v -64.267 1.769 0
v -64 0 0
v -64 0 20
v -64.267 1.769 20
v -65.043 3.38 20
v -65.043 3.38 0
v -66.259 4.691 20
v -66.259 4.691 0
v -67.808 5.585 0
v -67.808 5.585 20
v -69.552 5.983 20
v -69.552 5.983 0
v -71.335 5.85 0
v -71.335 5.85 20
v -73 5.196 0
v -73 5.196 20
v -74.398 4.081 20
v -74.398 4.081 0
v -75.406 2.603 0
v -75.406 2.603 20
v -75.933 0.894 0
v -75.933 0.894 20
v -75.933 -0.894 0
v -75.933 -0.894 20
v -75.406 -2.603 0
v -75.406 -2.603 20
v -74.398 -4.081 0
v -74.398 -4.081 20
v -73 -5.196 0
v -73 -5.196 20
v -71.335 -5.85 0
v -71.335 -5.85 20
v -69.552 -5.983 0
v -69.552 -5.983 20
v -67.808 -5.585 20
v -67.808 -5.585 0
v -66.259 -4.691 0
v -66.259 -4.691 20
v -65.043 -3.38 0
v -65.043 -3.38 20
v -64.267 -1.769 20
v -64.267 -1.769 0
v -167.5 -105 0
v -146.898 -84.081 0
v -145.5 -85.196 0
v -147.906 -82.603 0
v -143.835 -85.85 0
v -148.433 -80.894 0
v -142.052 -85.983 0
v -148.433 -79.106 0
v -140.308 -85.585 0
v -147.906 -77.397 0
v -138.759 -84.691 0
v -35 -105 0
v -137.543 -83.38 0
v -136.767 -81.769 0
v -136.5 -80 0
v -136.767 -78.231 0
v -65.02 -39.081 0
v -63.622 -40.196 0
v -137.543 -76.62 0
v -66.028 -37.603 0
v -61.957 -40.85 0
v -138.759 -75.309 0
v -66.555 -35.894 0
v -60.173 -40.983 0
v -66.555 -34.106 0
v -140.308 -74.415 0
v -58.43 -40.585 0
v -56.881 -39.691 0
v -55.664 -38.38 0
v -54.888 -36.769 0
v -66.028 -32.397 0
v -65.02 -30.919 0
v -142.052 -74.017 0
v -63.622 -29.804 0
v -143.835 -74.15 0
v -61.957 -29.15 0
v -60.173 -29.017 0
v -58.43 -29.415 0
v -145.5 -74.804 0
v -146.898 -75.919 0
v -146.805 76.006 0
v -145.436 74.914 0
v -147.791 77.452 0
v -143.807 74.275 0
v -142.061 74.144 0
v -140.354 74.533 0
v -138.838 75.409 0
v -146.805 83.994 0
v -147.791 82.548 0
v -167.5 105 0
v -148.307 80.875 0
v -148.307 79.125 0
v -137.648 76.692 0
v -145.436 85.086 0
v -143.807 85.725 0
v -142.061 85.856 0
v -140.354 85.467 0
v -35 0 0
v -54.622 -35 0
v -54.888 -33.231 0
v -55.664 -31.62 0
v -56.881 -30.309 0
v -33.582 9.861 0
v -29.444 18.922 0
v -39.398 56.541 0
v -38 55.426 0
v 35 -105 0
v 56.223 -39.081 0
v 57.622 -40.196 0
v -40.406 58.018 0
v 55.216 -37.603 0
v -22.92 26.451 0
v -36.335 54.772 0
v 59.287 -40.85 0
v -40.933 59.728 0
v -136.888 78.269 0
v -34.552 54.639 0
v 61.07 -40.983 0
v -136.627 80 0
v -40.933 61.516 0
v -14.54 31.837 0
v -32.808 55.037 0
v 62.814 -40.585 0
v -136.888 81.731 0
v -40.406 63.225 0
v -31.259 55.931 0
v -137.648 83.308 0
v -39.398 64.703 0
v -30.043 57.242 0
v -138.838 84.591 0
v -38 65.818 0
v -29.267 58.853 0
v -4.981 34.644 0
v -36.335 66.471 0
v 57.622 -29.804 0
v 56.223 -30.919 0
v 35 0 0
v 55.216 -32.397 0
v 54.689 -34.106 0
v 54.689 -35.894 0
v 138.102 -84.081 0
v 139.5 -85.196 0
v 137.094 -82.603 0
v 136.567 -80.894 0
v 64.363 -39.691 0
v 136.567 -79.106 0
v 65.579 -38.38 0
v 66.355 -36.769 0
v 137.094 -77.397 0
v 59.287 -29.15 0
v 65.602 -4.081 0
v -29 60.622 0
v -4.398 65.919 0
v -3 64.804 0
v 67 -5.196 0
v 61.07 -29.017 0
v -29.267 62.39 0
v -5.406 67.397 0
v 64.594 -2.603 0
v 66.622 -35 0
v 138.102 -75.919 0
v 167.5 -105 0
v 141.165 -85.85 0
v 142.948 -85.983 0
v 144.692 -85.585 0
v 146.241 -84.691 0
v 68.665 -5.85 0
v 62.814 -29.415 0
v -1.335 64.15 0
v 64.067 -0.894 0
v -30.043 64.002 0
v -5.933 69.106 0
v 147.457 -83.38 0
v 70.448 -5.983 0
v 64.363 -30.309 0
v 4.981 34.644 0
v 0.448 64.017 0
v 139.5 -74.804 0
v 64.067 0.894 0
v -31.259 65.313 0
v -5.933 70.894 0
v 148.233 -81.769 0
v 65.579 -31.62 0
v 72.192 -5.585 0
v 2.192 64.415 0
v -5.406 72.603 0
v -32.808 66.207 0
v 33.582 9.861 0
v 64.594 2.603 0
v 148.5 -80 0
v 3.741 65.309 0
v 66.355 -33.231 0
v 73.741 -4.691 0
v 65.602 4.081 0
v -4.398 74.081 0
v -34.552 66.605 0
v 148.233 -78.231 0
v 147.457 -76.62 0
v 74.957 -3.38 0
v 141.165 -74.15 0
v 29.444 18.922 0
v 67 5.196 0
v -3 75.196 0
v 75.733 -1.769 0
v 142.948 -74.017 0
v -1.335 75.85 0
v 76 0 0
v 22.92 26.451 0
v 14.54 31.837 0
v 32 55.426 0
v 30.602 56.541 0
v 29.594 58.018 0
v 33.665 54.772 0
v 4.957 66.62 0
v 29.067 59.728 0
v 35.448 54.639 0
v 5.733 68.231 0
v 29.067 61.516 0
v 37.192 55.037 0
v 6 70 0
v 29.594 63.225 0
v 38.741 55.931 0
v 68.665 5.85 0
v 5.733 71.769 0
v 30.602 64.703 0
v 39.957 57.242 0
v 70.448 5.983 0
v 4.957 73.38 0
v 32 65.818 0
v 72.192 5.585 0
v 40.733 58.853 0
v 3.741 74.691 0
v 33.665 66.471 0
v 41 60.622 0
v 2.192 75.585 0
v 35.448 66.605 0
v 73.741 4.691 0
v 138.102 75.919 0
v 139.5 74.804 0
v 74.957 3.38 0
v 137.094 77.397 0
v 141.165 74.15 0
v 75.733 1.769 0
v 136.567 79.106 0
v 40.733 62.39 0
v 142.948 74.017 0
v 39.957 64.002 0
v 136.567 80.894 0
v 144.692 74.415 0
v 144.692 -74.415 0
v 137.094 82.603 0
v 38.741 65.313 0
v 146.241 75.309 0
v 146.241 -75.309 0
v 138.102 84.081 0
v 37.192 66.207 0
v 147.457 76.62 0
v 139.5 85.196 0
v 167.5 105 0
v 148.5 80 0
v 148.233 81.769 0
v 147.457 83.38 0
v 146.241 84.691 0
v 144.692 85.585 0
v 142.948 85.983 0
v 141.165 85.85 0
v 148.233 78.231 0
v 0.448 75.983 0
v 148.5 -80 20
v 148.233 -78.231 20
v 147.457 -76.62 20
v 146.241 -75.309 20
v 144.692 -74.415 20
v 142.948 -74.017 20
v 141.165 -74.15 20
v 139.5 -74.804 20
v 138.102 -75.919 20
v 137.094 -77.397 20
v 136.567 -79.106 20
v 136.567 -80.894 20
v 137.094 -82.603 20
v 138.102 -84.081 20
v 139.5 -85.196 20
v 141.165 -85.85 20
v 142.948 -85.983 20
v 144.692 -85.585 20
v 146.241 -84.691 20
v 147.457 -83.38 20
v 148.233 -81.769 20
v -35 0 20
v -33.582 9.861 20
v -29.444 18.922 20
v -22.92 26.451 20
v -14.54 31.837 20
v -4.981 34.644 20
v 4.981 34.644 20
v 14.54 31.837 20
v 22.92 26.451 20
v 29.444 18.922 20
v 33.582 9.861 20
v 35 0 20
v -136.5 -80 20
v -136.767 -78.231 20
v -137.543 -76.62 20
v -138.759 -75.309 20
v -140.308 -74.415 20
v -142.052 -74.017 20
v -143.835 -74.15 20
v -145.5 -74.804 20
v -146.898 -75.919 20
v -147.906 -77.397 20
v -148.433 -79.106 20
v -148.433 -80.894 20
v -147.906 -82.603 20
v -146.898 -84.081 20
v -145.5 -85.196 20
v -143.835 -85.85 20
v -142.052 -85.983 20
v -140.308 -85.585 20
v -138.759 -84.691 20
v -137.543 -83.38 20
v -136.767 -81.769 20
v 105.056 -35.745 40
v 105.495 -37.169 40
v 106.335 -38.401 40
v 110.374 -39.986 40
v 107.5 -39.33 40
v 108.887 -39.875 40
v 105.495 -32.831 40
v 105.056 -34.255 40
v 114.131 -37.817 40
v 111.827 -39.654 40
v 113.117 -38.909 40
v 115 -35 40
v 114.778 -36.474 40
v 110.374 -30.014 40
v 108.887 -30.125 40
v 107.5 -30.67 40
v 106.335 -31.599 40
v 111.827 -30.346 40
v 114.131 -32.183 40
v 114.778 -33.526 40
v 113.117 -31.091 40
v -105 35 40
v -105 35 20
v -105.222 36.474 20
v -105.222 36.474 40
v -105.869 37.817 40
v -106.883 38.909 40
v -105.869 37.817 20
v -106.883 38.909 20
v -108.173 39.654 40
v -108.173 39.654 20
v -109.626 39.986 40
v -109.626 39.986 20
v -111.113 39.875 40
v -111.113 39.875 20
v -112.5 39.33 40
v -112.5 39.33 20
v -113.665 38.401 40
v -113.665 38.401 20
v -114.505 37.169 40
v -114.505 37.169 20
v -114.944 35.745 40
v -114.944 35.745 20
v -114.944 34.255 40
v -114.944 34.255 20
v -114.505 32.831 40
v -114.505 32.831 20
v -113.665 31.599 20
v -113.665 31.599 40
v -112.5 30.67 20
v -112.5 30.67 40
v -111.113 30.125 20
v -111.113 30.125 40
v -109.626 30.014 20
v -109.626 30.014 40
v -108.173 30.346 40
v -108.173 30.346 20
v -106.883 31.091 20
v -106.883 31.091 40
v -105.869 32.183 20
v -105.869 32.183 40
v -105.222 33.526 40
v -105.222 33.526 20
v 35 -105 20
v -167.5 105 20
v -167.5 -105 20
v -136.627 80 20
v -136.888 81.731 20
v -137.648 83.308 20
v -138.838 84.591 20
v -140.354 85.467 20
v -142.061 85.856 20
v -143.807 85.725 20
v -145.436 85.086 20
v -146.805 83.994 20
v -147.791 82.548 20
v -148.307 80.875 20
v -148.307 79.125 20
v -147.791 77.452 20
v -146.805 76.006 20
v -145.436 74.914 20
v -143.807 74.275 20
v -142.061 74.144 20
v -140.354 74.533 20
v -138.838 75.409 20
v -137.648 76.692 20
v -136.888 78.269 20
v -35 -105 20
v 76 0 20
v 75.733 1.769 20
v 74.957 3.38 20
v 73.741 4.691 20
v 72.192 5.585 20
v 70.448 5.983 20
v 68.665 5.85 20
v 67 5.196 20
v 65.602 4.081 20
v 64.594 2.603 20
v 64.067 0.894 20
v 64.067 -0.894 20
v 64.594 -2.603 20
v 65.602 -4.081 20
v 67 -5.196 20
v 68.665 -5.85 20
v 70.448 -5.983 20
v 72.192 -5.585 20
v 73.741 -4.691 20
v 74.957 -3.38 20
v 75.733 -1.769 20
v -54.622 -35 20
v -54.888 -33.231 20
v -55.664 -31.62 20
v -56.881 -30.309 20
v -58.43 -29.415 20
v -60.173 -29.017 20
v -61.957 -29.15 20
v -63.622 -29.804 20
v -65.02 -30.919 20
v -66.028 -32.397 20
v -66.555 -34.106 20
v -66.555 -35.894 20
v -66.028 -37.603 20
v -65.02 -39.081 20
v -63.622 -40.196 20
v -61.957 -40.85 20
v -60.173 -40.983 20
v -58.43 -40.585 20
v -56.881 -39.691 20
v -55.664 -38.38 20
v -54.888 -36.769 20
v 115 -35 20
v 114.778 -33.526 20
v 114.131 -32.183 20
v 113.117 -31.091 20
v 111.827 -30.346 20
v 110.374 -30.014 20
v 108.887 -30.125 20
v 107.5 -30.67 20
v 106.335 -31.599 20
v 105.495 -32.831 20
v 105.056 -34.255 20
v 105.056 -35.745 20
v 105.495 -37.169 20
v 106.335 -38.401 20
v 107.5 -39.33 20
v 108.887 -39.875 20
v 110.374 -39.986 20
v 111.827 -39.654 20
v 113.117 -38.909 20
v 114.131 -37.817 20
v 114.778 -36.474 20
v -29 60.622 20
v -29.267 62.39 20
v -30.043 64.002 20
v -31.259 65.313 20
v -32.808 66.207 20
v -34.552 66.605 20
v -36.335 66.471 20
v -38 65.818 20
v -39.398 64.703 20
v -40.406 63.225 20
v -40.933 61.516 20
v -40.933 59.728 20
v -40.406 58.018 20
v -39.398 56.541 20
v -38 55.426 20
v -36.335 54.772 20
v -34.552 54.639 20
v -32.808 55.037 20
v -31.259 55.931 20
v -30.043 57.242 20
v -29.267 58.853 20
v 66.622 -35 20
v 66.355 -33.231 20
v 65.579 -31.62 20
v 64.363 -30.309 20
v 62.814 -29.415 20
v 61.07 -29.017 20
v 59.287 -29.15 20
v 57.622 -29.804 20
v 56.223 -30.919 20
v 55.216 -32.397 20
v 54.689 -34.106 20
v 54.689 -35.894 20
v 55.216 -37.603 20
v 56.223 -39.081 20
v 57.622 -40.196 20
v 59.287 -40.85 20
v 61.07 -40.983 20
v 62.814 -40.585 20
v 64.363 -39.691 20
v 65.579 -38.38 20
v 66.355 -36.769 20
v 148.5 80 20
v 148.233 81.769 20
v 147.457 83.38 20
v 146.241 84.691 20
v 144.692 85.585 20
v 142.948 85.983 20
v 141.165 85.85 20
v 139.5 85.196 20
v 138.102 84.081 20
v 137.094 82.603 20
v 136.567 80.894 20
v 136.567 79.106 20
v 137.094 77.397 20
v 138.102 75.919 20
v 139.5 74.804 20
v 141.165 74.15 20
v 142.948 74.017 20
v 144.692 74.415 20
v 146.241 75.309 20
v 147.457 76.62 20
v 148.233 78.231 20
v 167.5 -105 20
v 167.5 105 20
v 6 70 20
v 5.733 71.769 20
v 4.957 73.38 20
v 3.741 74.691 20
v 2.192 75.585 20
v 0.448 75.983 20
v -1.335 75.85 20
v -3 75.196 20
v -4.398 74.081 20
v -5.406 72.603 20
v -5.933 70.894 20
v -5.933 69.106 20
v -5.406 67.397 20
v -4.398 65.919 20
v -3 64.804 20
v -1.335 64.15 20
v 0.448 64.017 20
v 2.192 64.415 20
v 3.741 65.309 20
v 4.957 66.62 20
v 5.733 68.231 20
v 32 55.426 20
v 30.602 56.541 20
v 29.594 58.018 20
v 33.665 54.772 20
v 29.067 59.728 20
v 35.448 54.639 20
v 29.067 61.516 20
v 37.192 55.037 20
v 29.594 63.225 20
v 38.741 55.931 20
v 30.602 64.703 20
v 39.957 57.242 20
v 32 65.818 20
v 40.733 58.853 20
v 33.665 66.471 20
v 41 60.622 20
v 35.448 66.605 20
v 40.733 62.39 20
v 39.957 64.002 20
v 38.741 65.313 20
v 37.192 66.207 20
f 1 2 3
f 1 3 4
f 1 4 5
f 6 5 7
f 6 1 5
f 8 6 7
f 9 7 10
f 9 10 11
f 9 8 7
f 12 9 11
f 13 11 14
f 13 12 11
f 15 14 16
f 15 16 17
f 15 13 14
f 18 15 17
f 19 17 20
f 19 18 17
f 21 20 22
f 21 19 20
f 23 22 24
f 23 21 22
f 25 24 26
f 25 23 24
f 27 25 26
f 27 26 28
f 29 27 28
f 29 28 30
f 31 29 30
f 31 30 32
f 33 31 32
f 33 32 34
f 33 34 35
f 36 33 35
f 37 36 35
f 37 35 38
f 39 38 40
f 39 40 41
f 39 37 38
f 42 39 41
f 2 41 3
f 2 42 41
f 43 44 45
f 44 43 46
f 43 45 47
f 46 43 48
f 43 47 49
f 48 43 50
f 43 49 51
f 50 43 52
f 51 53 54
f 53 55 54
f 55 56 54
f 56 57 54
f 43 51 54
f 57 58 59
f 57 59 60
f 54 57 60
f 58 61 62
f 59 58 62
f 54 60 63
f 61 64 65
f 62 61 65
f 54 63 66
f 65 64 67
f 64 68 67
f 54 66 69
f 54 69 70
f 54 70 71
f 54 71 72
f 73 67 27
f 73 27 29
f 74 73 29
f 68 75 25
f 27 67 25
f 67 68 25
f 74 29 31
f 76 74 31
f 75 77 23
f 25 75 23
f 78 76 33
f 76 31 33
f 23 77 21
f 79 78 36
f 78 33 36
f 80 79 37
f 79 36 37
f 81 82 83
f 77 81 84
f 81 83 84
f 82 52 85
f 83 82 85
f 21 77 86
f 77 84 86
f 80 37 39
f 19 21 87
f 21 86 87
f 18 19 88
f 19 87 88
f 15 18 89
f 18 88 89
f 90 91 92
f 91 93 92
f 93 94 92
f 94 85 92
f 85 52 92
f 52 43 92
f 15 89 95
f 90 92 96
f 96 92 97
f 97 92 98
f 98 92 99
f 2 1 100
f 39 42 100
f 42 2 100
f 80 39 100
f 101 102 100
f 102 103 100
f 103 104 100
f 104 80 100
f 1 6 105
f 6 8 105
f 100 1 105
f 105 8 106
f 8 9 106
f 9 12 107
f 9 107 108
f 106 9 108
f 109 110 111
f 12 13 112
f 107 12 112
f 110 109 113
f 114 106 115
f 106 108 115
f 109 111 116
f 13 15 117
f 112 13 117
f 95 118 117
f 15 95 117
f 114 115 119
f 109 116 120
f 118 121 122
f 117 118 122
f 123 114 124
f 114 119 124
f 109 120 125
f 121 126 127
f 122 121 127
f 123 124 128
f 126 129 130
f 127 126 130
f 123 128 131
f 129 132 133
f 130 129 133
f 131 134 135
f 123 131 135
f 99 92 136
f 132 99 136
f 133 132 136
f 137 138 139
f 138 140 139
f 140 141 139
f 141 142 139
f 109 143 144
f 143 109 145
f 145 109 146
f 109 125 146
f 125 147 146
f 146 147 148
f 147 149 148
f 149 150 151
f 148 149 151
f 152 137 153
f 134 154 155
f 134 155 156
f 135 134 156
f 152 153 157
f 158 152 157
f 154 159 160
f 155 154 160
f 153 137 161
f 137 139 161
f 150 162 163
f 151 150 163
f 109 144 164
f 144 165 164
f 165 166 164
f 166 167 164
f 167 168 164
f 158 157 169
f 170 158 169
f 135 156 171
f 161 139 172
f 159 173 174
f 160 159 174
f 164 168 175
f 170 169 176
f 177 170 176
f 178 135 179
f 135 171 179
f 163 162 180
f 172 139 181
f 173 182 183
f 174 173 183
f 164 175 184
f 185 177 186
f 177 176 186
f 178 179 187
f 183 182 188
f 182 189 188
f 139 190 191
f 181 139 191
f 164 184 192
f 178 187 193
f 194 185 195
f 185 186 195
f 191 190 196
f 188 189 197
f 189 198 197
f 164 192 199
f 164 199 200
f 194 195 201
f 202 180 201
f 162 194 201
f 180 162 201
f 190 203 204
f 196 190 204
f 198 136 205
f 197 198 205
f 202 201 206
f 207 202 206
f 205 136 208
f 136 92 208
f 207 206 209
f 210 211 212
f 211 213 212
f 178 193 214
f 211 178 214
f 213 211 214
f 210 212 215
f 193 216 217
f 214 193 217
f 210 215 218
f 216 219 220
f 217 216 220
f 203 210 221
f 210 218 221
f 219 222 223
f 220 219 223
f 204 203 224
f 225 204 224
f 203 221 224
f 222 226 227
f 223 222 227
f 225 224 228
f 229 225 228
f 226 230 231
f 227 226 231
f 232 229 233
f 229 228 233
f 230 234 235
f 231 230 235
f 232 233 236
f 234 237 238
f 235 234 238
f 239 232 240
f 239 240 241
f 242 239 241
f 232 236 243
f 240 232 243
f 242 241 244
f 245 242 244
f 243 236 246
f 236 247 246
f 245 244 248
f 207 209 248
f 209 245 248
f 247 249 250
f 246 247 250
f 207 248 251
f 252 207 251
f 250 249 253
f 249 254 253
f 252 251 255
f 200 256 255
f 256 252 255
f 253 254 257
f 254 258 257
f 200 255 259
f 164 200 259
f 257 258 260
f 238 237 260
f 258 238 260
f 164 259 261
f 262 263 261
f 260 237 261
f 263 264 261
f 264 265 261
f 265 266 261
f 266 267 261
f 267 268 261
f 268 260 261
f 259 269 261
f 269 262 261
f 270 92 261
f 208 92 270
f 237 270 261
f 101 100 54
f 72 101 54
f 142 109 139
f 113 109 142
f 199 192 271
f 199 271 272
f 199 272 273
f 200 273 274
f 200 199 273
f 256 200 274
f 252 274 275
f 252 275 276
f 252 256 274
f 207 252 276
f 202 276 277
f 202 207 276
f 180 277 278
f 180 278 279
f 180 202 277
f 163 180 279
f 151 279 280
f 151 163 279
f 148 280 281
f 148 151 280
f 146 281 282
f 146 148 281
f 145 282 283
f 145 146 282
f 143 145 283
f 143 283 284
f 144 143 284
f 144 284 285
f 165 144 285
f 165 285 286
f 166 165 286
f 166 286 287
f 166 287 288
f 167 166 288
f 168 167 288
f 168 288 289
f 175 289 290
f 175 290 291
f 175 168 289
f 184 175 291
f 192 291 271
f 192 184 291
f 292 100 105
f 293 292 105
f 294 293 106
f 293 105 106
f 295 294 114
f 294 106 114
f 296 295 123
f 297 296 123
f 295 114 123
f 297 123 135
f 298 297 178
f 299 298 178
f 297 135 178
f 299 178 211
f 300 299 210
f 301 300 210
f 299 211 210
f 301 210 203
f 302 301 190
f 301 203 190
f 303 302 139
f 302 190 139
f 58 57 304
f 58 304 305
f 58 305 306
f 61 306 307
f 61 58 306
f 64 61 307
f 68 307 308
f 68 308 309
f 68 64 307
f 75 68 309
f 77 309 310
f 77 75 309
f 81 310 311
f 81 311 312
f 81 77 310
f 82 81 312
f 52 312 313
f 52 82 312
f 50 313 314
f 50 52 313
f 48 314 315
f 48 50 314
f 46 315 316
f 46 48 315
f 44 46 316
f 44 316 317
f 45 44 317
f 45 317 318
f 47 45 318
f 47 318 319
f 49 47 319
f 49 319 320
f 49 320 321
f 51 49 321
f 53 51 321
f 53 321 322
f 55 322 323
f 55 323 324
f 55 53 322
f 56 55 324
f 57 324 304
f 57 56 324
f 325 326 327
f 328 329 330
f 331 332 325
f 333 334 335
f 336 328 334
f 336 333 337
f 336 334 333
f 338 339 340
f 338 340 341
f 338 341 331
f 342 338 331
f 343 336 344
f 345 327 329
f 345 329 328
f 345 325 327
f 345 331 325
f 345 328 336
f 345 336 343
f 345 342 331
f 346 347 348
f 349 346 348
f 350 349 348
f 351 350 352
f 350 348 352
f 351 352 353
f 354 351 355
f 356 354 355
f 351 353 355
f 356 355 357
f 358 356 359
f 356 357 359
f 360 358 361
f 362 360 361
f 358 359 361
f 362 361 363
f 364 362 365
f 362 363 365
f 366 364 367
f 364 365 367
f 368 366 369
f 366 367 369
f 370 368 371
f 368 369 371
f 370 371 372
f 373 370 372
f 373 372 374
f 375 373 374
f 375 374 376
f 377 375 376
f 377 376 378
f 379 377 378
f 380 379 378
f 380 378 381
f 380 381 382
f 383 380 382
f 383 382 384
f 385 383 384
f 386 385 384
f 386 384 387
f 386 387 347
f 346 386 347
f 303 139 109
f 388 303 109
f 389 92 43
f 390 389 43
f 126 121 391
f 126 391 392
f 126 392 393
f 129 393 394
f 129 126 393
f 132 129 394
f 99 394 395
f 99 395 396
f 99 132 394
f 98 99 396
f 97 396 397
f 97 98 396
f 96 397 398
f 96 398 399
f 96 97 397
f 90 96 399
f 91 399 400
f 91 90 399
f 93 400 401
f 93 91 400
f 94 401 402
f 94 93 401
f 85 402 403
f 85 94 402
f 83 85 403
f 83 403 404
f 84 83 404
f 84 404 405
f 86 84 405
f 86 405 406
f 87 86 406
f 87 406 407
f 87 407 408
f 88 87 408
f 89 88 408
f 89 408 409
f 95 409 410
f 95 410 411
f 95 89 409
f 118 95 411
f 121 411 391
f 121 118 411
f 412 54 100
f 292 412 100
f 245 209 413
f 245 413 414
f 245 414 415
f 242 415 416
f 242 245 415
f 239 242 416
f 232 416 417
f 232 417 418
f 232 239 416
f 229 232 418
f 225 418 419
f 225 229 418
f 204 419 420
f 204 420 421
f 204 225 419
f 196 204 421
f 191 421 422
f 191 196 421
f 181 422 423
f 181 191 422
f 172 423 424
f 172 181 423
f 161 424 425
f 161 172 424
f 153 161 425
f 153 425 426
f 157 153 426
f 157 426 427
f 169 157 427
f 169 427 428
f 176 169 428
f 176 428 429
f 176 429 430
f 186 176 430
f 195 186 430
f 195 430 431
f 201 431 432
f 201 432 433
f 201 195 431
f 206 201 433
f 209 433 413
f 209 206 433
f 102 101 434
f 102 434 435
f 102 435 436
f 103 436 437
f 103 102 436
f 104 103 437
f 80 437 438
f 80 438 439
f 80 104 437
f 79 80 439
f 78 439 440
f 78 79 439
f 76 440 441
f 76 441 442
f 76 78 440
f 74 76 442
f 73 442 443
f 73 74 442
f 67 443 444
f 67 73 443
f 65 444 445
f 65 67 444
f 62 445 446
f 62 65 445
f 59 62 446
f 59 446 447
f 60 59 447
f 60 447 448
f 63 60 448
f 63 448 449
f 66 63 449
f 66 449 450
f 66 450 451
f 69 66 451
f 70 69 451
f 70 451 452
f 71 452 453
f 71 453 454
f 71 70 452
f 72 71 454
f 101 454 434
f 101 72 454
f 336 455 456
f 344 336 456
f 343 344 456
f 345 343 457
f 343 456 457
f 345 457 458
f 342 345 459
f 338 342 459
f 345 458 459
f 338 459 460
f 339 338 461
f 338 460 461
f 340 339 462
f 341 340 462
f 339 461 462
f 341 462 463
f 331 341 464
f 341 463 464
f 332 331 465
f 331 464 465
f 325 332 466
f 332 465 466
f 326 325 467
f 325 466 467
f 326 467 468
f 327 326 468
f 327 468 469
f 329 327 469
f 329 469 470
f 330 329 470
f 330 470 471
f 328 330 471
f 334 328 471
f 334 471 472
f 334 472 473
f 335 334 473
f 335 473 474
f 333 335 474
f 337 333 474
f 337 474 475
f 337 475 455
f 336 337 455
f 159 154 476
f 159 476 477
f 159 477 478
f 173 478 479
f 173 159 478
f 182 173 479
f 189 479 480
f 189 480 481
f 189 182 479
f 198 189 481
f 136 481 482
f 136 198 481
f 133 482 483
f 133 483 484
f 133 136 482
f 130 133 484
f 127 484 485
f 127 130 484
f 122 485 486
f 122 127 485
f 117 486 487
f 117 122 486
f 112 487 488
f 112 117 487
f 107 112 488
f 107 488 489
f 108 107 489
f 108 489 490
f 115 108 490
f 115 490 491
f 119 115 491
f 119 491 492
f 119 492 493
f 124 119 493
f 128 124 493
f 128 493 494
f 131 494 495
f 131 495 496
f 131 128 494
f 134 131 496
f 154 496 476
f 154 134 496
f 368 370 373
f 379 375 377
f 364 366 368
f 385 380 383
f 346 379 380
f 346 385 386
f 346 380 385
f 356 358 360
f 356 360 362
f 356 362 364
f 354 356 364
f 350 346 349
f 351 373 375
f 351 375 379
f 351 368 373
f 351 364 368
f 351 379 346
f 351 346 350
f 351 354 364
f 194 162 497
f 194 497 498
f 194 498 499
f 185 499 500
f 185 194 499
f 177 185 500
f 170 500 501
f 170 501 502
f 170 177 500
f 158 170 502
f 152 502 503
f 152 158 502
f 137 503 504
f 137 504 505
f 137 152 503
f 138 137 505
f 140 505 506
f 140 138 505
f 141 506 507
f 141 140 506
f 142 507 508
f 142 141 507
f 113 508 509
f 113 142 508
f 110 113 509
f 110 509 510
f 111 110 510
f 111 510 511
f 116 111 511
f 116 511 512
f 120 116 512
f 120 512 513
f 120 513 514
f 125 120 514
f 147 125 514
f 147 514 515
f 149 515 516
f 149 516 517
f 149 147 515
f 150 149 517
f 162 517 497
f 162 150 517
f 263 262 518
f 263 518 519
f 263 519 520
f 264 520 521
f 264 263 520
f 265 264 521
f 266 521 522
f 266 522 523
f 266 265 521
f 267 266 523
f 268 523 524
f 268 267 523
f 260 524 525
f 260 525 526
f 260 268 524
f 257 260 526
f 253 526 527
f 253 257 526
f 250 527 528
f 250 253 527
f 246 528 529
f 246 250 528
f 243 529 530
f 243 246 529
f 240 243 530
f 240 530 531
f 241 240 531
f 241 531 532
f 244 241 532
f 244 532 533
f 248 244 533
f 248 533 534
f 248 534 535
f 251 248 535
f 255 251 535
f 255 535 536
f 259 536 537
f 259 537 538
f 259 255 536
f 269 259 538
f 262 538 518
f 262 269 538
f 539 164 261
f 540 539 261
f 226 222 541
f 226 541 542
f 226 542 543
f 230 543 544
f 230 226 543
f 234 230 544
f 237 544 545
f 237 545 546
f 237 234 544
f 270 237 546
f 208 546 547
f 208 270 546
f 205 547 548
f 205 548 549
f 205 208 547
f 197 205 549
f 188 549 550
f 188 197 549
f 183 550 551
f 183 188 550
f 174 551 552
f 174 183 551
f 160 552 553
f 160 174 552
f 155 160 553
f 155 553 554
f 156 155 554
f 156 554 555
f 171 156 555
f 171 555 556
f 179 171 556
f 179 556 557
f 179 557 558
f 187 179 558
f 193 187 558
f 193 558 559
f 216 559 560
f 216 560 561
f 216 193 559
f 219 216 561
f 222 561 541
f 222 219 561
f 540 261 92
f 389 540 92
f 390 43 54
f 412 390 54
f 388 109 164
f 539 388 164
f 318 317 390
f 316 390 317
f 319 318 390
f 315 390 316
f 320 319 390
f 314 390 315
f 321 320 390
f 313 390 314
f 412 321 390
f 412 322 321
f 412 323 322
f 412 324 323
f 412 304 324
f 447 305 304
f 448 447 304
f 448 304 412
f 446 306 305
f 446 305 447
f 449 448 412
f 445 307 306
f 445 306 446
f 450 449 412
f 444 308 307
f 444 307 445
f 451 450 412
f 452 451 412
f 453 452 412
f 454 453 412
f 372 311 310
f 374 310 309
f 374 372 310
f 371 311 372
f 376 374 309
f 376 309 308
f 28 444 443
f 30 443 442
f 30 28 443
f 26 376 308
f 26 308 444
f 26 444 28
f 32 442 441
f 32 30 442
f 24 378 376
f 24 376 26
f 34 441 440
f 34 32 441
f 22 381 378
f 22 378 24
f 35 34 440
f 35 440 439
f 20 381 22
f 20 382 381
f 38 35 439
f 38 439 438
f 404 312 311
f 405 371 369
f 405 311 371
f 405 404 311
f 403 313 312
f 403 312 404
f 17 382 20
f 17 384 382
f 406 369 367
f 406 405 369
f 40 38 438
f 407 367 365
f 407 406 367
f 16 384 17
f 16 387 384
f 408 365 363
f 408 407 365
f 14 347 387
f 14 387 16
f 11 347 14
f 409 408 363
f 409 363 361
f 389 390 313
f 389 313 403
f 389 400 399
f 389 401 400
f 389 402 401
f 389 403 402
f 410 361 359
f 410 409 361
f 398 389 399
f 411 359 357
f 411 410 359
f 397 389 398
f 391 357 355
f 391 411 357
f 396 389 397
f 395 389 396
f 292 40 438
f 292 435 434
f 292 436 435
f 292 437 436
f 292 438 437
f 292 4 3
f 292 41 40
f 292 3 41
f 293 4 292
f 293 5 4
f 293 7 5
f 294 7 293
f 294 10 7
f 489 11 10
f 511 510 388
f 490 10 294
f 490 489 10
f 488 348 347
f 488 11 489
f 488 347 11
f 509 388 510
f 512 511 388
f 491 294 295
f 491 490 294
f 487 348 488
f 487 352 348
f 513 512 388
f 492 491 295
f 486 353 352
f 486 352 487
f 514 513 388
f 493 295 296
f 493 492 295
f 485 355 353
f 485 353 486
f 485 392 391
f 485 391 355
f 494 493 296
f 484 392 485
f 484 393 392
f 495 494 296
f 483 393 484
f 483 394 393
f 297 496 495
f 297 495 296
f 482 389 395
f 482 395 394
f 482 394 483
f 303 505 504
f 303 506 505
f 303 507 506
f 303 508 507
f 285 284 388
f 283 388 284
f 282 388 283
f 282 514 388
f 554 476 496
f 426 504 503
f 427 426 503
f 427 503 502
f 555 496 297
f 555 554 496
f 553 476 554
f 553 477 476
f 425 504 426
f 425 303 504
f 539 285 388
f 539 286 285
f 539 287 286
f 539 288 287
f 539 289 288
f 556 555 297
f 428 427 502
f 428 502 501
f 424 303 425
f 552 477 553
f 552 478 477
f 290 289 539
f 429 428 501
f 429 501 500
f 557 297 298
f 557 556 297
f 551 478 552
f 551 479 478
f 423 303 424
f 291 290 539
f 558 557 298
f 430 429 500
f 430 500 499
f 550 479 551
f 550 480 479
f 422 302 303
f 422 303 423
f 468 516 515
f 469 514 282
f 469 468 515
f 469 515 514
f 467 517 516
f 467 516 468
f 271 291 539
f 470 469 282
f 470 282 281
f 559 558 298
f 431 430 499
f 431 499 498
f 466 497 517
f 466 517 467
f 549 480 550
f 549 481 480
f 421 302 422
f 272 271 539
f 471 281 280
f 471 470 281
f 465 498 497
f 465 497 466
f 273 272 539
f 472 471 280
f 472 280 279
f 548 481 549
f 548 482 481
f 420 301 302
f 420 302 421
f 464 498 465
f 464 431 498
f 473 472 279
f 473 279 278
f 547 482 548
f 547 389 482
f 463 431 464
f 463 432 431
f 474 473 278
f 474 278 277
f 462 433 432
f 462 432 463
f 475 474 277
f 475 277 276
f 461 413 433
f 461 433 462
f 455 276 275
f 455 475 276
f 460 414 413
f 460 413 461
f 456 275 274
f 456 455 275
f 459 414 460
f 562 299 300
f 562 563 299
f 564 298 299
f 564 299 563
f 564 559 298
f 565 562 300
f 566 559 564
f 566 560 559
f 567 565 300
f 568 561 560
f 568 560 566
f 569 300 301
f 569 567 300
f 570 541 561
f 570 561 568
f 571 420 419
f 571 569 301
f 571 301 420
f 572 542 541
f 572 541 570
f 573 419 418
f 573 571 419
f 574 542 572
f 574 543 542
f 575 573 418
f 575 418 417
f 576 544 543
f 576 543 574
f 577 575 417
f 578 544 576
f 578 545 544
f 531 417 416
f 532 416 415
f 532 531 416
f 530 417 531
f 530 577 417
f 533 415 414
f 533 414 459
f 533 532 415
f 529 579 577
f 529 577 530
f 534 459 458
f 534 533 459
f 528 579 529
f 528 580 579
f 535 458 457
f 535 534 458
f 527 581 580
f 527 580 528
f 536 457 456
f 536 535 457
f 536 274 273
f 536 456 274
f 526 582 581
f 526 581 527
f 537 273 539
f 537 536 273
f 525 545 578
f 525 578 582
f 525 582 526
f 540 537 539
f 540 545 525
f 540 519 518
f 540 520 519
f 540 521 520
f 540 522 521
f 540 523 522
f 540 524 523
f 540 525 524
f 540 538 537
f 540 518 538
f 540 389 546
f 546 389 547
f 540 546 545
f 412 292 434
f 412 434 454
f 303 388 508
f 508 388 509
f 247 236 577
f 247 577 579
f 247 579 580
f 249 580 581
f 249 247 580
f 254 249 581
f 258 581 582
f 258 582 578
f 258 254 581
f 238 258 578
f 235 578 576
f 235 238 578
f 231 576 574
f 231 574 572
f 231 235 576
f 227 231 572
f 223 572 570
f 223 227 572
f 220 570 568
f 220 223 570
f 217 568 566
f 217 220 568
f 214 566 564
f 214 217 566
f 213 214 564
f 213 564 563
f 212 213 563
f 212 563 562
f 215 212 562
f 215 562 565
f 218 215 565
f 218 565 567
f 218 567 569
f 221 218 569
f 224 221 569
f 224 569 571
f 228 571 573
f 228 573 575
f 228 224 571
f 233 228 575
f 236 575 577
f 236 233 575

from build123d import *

# Parameters (mm, degrees)
F0_R     = 6
F0_R_2   = 5
F0_R_3   = 5.872705
F1_DEPTH = 20
F2_DEPTH = 40


with BuildPart() as f1:
    # F0 (on Top) → F1 (new body)
    with BuildSketch(Plane.XY):
        with BuildLine():
            Line((167.5, 105), (-167.5, 105))
            Line((-167.5, 105), (-167.5, -105))
            Line((-167.5, -105), (-35, -105))
            Line((-35, -105), (-35, 0))
            ThreePointArc((-35, 0), (0, 35), (35, 0))
            Line((35, 0), (35, -105))
            Line((35, -105), (167.5, -105))
            Line((167.5, -105), (167.5, 105))
        make_face()
        with Locations((-142.5, -80)):
            Circle(F0_R, mode=Mode.SUBTRACT)
        with Locations((-60.621778, -35)):
            Circle(F0_R, mode=Mode.SUBTRACT)
        with Locations((142.5, -80)):
            Circle(F0_R, mode=Mode.SUBTRACT)
        with Locations((60.621778, -35)):
            Circle(F0_R, mode=Mode.SUBTRACT)
        with Locations((110, -35)):
            Circle(F0_R_2, mode=Mode.SUBTRACT)
        with Locations((-110, 35)):
            Circle(F0_R_2, mode=Mode.SUBTRACT)
        with Locations((-70, 0)):
            Circle(F0_R, mode=Mode.SUBTRACT)
        with Locations((-142.5, 80)):
            Circle(F0_R_3, mode=Mode.SUBTRACT)
        with Locations((-35, 60.621778)):
            Circle(F0_R, mode=Mode.SUBTRACT)
        with Locations((70, 0)):
            Circle(F0_R, mode=Mode.SUBTRACT)
        with Locations((35, 60.621778)):
            Circle(F0_R, mode=Mode.SUBTRACT)
        with Locations((0, 70)):
            Circle(F0_R, mode=Mode.SUBTRACT)
        with Locations((142.5, 80)):
            Circle(F0_R, mode=Mode.SUBTRACT)
    extrude(amount=F1_DEPTH)

    # F0 (on Top) → F2 (join)
    with BuildSketch(Plane.XY):
        with Locations((-110, 35)):
            Circle(F0_R_2)
        with Locations((110, -35)):
            Circle(F0_R_2)
    extrude(amount=F2_DEPTH)


solid = f1.part
